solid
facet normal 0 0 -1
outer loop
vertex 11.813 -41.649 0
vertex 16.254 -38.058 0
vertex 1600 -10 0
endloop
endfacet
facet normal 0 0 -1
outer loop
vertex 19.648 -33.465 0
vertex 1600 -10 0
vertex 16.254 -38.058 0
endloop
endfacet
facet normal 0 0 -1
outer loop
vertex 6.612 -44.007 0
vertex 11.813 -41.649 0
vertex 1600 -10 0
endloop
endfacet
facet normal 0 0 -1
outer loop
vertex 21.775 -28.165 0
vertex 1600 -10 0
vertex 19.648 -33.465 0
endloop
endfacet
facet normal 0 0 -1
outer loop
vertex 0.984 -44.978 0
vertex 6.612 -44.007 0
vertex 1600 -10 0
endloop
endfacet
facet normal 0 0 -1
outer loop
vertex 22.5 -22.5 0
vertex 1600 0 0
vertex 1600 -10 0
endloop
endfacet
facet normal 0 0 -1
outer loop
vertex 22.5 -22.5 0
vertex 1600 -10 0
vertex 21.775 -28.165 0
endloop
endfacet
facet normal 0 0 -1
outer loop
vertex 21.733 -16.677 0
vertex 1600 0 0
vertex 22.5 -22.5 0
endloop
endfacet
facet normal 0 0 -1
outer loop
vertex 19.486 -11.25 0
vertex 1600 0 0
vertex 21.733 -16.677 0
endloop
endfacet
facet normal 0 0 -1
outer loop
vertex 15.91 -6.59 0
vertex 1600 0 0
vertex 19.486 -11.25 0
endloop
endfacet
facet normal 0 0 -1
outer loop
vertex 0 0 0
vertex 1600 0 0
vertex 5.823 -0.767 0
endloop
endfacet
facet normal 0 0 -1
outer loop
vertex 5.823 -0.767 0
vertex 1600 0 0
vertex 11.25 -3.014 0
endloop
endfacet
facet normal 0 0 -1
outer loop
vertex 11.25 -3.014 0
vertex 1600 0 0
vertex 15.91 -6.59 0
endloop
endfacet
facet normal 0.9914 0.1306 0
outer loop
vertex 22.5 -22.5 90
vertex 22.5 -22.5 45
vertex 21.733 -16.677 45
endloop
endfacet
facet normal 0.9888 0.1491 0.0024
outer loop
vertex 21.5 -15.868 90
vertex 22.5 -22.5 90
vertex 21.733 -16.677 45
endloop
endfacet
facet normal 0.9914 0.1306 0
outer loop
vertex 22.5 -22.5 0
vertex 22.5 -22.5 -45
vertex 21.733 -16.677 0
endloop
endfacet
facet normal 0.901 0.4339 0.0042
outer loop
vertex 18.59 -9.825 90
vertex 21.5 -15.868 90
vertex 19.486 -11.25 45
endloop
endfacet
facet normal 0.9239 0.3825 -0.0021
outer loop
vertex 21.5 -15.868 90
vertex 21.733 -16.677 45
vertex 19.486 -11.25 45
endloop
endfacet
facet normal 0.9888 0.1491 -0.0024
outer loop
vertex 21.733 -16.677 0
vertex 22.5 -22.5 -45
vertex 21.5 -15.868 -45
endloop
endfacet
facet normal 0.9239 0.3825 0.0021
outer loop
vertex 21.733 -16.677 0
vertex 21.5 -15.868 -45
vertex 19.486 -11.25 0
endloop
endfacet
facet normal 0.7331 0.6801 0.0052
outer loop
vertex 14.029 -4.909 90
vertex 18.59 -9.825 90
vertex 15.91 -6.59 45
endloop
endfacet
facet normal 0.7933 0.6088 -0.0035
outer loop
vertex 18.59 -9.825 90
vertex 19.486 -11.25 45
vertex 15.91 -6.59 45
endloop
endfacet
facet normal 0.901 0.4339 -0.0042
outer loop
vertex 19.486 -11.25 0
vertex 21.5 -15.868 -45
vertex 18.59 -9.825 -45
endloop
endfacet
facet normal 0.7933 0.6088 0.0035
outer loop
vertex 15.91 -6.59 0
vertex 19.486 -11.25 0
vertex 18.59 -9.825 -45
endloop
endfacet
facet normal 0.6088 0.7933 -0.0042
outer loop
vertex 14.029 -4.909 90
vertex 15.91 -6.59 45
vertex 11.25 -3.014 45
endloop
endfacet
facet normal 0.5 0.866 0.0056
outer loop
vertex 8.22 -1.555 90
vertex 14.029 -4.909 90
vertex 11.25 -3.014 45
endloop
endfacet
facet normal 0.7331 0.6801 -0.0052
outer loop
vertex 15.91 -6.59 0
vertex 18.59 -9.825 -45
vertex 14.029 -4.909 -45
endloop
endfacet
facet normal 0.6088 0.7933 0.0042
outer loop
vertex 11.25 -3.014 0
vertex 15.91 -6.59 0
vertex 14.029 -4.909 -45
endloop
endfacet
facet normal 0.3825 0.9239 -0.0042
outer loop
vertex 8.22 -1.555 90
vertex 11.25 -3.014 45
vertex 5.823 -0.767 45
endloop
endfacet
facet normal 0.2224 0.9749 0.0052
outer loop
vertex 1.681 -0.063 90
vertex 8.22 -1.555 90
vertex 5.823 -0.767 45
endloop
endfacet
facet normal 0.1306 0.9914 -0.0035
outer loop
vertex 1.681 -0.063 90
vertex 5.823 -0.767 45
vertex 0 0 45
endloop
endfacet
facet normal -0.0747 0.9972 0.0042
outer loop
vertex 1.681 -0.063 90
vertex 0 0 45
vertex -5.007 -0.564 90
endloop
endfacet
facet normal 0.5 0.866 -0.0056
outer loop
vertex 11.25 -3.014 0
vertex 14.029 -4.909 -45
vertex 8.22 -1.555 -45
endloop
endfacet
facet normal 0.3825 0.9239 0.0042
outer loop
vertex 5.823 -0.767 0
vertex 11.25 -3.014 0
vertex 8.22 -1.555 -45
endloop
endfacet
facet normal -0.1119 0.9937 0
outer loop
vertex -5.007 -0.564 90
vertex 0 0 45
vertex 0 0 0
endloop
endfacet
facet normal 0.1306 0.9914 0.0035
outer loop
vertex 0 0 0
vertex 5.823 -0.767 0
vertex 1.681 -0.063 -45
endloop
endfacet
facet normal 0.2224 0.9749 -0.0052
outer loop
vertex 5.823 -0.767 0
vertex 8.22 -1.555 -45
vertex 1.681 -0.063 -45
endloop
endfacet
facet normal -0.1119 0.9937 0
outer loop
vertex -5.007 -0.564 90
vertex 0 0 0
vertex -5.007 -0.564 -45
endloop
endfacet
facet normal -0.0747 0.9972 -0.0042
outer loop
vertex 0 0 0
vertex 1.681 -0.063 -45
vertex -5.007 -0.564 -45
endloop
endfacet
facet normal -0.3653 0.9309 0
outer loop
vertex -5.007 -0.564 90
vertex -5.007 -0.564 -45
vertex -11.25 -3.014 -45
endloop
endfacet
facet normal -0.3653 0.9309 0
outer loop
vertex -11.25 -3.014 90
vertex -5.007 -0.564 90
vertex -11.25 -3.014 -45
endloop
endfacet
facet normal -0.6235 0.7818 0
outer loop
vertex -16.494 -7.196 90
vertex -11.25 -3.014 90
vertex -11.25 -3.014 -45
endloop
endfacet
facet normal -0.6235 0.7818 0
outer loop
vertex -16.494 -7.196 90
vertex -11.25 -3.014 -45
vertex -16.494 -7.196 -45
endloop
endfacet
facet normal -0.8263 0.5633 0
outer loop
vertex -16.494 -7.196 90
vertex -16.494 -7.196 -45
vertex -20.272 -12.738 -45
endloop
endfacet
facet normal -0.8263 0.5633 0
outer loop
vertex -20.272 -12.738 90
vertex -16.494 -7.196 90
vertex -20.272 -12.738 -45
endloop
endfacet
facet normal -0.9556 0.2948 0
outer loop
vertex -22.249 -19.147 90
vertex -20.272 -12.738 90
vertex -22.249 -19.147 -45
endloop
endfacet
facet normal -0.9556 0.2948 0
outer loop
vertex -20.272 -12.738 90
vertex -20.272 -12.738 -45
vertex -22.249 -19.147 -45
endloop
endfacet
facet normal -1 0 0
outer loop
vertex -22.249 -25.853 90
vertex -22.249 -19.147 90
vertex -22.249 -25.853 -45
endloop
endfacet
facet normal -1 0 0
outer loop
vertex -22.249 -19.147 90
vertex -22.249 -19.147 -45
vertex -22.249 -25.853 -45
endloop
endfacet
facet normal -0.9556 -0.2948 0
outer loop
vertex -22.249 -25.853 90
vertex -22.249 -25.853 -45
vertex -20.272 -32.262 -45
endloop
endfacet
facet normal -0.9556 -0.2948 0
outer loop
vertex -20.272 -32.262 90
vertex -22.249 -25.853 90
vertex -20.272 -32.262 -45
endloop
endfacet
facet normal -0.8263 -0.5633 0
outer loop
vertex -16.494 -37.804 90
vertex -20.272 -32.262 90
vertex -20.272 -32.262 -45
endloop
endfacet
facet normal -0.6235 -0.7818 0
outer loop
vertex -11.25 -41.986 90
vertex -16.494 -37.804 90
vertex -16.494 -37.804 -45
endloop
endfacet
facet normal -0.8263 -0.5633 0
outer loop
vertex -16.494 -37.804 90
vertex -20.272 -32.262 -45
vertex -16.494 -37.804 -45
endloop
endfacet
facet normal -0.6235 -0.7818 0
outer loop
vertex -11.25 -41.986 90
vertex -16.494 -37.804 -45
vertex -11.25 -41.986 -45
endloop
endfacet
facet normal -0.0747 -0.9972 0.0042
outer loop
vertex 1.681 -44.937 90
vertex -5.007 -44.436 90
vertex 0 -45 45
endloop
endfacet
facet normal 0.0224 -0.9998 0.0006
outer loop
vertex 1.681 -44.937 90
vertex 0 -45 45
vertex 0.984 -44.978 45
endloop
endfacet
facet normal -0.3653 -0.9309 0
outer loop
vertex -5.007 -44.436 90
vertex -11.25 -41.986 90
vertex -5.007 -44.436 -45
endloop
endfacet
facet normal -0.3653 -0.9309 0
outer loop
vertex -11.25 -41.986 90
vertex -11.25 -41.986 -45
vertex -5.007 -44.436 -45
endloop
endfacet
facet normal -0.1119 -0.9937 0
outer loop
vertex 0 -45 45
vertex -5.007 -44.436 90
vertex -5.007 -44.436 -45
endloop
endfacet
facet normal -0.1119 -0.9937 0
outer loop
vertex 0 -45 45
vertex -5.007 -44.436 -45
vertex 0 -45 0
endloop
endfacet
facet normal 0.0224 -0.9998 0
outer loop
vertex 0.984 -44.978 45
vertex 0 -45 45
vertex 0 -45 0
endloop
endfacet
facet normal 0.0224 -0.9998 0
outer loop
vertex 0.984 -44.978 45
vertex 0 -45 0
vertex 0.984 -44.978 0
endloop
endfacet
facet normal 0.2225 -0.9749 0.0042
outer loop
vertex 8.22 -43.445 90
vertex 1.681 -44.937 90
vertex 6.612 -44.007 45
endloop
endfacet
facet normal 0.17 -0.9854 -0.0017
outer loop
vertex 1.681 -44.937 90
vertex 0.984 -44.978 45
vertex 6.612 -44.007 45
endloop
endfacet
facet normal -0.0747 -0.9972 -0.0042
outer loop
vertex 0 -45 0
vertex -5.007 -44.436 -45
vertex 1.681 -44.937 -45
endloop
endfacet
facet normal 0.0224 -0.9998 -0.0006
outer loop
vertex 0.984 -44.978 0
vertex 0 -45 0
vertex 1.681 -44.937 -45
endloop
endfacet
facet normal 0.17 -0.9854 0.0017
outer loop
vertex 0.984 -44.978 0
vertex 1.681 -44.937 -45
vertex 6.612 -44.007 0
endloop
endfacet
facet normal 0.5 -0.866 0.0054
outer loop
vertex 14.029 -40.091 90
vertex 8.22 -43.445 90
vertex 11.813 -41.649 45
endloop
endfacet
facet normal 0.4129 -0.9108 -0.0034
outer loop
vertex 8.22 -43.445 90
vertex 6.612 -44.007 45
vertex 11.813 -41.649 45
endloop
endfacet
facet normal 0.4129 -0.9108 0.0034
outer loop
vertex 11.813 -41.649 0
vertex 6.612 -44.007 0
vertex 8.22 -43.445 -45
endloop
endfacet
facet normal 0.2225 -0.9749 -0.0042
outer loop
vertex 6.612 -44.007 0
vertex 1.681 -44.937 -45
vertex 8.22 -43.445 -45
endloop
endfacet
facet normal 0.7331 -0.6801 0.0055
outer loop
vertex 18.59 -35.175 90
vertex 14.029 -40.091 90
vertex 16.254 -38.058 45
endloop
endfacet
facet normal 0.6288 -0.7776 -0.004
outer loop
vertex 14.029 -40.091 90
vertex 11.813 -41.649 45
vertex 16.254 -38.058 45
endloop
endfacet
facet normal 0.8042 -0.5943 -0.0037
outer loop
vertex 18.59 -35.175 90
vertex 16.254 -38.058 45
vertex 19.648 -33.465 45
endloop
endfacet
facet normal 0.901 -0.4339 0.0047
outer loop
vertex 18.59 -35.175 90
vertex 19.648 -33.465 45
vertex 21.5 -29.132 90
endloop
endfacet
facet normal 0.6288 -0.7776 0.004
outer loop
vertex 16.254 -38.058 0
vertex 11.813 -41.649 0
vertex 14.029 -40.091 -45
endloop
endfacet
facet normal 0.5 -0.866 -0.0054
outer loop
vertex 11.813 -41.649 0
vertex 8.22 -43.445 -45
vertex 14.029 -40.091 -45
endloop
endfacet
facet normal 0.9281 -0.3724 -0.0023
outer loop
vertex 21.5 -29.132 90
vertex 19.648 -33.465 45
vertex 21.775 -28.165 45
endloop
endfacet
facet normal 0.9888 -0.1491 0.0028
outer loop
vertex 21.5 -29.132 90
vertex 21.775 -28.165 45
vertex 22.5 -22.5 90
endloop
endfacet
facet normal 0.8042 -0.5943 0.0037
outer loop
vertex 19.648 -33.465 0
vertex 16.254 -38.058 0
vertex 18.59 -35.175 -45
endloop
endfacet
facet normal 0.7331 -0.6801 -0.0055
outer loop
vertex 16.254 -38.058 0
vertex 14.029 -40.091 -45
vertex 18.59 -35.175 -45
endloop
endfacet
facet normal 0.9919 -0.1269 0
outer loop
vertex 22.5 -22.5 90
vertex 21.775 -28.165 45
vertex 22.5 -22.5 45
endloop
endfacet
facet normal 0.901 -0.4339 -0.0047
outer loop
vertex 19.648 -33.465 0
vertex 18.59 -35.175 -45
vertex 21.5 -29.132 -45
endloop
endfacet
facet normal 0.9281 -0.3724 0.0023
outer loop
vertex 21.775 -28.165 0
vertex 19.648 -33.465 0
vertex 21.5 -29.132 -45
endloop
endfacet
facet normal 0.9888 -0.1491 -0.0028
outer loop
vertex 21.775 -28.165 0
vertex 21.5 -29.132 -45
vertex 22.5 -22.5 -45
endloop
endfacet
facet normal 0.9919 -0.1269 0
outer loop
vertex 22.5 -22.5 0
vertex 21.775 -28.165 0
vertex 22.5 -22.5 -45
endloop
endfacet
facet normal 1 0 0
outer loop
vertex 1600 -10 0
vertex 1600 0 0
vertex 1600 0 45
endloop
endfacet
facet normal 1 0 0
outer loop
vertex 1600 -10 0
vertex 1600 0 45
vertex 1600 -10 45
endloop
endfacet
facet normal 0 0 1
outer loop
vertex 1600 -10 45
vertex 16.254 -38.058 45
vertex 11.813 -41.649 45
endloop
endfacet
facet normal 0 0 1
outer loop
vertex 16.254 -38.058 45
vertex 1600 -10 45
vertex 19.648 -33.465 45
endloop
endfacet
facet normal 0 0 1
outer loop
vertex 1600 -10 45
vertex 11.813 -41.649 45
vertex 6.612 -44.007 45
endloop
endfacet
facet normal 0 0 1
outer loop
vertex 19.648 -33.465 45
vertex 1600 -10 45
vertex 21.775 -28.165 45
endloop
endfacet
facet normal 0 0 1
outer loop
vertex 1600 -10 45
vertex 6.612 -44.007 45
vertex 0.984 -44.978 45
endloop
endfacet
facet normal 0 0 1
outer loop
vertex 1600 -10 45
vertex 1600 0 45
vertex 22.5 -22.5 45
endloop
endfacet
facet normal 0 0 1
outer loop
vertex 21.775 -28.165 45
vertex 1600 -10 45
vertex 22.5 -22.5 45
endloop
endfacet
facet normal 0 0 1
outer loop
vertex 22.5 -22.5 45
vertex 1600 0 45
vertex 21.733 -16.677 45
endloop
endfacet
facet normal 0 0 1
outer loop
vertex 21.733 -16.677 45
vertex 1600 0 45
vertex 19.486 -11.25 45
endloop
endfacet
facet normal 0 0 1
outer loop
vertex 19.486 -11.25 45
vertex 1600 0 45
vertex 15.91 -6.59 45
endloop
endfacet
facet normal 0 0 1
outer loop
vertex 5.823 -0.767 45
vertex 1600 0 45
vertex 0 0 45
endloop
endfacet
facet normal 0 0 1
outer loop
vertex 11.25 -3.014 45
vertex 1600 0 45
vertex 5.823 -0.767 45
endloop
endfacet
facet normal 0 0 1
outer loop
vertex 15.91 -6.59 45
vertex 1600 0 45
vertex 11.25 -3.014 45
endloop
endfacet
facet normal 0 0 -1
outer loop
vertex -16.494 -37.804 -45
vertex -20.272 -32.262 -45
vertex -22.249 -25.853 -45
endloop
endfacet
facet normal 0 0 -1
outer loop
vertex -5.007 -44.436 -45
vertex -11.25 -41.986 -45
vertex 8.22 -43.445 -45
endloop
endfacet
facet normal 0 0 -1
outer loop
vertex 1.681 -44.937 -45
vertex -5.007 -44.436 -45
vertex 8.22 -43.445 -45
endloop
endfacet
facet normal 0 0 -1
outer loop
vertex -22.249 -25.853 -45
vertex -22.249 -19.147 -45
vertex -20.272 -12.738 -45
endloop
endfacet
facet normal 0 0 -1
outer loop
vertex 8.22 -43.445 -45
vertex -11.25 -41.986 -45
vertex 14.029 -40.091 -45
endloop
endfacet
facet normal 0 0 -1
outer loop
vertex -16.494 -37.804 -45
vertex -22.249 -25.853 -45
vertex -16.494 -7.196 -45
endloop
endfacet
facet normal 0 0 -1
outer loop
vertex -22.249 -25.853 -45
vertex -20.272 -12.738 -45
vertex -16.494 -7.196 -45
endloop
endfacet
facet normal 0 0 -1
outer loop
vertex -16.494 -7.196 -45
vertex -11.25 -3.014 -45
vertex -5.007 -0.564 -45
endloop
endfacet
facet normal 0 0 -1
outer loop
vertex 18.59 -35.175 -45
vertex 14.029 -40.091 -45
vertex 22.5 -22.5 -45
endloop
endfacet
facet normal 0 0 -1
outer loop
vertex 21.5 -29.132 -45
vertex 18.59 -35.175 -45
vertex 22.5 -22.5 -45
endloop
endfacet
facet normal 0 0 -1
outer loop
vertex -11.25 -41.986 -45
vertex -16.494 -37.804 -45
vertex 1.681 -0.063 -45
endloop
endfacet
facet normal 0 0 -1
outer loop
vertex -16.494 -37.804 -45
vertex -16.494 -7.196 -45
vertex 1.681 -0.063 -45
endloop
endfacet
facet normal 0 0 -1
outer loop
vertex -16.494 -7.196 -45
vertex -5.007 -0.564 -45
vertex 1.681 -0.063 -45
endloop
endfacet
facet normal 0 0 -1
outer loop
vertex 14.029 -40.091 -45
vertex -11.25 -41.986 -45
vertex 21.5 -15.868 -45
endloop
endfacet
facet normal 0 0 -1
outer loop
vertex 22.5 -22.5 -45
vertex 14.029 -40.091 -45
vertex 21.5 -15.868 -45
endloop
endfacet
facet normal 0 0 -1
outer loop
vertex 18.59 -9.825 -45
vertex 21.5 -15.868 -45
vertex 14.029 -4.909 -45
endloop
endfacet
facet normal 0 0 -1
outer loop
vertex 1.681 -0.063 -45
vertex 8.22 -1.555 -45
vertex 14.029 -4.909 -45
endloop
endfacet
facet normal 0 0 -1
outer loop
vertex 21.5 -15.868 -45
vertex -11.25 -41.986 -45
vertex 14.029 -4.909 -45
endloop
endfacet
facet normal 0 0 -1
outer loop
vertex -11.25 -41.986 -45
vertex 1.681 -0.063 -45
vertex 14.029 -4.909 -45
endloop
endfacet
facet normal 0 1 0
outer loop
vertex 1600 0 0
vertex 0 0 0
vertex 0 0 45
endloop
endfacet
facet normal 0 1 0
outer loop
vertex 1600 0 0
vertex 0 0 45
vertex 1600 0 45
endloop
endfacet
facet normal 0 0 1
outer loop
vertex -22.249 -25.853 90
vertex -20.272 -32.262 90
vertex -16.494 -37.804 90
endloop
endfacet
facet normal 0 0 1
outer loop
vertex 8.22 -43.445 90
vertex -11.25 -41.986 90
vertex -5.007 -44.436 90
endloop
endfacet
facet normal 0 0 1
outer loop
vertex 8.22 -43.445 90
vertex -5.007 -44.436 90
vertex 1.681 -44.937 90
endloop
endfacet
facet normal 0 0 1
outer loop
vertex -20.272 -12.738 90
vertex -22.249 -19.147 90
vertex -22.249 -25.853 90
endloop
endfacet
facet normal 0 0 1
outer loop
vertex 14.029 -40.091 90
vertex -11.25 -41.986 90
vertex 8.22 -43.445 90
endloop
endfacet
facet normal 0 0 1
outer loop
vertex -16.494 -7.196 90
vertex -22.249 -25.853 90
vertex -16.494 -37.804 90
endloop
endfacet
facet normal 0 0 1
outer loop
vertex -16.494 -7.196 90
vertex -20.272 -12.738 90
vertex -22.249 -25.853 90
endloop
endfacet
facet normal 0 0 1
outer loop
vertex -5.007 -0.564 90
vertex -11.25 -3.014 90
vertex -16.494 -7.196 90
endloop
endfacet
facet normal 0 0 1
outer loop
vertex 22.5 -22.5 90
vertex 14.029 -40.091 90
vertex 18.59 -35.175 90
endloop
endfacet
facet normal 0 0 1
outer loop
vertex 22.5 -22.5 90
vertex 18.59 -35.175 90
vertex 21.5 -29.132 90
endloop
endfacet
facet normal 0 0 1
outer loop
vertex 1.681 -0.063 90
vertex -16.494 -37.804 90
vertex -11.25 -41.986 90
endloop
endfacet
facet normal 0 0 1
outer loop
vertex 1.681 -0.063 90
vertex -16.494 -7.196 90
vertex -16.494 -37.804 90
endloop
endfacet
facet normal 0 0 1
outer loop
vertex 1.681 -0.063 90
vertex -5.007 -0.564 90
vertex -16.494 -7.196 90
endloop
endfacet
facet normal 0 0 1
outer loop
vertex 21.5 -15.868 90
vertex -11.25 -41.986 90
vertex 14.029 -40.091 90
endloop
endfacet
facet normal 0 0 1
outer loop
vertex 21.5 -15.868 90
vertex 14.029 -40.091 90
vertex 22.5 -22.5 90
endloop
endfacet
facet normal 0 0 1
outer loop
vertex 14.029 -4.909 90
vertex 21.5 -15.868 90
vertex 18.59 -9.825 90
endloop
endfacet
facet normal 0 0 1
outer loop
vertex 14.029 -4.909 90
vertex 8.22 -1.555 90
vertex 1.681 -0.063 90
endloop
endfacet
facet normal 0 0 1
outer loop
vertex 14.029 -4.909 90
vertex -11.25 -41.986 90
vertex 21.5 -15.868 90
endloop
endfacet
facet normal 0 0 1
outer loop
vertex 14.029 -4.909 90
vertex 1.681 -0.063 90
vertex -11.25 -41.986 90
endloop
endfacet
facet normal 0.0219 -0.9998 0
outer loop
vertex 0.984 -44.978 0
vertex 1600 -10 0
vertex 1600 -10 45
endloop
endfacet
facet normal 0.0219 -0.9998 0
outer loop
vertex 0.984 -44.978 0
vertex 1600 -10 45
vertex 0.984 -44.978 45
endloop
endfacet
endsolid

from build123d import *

# Parameters (mm, degrees)
BOSS_EXTRUDE1_DEPTH      = 45
BOSS_EXTRUDE2_DEPTH      = 45
BOSS_EXTRUDE2_DEPTH_BACK = 90
SKETCH2_R                = 22.5


with BuildPart() as part:
    # Sketch1 → Boss-Extrude1 (new body)
    with BuildSketch(Plane.XY):
        Polygon((0, 0), (1600, 0), (1600, -10), (0, -45), align=None)
    extrude(amount=BOSS_EXTRUDE1_DEPTH)

    # Sketch2 → Boss-Extrude2 (add, two sides: drawn at the far end of the back side and taken through both)
    with BuildSketch(Plane.XY.offset(45).offset(-BOSS_EXTRUDE2_DEPTH_BACK)):
        with Locations((0, -22.5)):
            Circle(SKETCH2_R)
    extrude(amount=BOSS_EXTRUDE2_DEPTH + BOSS_EXTRUDE2_DEPTH_BACK)


solid = part.part
